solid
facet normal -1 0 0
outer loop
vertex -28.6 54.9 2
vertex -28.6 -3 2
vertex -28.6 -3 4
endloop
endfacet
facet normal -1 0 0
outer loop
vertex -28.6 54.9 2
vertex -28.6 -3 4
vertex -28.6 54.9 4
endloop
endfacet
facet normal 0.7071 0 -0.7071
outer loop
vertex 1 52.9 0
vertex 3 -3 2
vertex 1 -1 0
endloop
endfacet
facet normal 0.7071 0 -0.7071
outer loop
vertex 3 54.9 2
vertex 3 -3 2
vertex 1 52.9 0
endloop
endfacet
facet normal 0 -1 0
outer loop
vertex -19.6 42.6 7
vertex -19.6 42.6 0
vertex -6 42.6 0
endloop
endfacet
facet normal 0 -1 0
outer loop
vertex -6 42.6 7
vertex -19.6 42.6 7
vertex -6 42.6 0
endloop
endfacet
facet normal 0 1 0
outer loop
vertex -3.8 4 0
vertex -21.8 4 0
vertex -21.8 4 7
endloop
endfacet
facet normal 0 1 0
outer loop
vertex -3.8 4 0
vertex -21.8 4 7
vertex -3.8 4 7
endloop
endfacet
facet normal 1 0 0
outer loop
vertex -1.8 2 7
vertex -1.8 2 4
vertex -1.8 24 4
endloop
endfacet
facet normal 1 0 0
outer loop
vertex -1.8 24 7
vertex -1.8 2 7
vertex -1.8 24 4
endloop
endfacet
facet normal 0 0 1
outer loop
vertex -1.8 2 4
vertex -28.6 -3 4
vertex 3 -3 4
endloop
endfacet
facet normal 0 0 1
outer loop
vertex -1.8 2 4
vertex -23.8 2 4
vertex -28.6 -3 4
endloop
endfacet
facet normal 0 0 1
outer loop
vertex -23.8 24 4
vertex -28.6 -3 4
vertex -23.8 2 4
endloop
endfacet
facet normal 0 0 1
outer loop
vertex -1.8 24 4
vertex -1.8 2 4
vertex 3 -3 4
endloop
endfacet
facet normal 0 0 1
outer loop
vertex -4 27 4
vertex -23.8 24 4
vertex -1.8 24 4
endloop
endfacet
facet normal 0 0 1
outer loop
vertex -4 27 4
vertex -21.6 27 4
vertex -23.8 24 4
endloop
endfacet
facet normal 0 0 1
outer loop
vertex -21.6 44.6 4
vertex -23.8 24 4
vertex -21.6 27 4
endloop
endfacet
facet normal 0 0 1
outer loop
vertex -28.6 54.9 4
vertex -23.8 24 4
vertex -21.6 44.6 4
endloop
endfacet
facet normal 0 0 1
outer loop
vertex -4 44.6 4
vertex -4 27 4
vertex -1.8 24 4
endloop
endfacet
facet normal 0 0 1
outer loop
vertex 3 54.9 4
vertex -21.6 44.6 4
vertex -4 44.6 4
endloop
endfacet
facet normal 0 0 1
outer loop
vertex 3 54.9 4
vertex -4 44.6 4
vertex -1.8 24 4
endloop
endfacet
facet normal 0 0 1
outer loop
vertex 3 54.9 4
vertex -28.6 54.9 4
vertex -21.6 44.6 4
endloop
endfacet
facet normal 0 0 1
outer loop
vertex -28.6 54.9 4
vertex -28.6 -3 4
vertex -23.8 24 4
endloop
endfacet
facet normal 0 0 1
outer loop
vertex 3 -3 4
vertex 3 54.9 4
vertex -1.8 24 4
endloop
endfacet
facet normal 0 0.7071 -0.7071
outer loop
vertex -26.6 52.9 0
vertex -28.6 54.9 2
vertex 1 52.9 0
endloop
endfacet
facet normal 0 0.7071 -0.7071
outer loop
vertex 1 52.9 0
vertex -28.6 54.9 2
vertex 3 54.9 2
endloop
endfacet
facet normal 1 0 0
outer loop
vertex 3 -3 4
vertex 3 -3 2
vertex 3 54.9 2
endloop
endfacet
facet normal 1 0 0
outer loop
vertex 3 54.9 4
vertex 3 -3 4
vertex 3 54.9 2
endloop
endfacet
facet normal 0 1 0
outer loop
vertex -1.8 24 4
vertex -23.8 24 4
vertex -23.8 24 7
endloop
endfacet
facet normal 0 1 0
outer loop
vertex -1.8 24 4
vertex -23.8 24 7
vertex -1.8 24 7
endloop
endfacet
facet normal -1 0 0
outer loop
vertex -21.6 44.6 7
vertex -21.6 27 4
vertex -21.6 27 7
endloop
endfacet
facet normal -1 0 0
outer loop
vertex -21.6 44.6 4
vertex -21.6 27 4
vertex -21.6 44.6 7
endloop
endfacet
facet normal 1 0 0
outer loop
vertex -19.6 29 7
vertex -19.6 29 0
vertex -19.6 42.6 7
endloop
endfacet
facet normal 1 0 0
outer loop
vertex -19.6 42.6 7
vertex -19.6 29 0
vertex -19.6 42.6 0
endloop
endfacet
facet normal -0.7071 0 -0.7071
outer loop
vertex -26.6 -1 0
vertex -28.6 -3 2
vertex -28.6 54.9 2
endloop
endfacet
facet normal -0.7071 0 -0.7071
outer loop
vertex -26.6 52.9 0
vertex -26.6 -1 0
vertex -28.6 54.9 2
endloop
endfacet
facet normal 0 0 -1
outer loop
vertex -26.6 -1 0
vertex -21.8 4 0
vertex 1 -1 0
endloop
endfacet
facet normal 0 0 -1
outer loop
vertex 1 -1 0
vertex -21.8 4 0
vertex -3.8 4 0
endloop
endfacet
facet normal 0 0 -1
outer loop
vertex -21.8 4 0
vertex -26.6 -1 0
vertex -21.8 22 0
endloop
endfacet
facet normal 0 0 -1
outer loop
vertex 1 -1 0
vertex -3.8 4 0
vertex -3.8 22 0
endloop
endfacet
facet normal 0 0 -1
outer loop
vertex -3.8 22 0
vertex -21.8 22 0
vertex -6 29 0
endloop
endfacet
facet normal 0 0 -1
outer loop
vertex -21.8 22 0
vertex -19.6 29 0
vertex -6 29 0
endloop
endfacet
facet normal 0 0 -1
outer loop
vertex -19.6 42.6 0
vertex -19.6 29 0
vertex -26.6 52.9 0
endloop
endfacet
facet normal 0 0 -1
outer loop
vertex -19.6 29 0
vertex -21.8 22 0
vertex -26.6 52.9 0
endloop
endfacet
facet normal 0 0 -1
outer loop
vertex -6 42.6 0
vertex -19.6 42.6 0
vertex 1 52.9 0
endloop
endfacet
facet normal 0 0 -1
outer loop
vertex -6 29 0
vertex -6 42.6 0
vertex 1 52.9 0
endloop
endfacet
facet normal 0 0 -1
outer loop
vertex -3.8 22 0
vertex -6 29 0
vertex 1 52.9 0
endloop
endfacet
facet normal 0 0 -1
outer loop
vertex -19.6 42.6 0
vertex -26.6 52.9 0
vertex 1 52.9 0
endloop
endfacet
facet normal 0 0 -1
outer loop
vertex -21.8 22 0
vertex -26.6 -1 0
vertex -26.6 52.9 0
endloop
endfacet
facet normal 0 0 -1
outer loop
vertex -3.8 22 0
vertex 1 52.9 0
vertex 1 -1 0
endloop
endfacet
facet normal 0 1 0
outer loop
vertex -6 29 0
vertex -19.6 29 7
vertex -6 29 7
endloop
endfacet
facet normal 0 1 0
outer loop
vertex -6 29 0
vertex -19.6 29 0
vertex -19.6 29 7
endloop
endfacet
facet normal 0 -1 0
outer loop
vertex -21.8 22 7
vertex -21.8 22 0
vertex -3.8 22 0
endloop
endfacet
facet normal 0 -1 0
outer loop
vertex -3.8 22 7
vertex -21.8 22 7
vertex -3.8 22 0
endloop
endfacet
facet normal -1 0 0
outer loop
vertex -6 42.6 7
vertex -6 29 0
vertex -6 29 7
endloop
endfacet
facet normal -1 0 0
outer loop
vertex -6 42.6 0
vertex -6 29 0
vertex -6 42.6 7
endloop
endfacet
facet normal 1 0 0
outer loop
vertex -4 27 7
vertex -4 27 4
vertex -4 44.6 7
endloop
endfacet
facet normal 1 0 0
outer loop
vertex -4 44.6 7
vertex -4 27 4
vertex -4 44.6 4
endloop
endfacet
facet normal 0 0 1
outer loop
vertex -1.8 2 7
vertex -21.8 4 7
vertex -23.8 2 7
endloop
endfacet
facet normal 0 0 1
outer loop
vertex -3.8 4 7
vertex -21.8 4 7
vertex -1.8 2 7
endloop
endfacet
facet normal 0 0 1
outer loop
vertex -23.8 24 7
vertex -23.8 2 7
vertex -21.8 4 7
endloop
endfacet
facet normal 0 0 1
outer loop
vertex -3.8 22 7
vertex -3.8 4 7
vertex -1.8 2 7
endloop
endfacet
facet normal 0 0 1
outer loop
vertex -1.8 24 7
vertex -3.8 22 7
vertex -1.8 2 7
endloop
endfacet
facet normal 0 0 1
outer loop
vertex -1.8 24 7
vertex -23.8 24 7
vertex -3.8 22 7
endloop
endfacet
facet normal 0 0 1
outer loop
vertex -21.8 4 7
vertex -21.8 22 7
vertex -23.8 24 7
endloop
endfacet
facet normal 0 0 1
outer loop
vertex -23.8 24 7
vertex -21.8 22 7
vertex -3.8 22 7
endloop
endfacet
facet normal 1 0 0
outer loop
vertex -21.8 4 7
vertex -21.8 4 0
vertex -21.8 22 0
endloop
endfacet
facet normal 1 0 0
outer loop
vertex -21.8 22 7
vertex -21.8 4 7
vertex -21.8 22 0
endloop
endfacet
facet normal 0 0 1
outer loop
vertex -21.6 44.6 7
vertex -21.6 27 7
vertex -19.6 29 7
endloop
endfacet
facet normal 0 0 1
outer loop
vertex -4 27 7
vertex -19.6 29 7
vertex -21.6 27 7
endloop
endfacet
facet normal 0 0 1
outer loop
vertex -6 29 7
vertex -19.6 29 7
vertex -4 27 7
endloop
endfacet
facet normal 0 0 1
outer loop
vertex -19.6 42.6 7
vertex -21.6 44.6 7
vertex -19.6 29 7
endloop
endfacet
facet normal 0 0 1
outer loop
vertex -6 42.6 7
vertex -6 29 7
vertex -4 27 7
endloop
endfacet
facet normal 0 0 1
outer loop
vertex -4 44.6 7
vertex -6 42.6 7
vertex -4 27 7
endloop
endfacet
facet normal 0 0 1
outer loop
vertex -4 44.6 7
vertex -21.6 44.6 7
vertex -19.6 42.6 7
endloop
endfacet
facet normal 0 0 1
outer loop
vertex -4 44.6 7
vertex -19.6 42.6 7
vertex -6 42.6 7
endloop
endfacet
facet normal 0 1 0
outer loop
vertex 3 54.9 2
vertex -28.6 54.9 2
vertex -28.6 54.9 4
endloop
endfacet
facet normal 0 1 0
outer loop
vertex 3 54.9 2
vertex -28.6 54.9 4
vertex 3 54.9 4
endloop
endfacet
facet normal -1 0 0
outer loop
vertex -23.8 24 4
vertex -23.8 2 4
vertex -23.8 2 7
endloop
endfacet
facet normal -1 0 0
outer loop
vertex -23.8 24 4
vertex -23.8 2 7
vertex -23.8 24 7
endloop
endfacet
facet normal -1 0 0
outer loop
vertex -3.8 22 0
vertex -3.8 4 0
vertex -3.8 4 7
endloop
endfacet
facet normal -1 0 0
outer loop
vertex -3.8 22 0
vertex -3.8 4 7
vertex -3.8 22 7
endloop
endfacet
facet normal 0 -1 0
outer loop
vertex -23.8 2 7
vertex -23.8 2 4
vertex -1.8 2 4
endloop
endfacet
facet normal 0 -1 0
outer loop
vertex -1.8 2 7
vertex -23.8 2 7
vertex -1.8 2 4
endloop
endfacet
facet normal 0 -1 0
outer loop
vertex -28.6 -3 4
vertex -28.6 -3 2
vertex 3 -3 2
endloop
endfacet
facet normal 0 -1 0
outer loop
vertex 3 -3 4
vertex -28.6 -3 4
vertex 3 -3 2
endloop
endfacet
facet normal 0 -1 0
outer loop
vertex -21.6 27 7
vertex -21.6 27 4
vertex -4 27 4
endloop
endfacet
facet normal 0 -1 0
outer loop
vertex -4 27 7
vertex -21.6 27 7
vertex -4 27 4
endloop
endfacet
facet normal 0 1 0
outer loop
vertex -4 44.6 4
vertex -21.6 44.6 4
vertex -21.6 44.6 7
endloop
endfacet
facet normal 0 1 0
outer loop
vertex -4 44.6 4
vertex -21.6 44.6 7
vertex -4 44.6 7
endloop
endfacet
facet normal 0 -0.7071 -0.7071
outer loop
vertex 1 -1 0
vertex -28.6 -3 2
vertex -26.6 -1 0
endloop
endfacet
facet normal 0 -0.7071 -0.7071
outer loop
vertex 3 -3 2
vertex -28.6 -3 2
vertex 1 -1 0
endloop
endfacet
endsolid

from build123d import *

# Parameters (mm, degrees)
F0_W     = 31.6
F0_H     = 57.9
F0_W_2   = 25.6
F0_H_2   = 51.9
F0_W_3   = 22
F0_H_3   = 22
F0_W_4   = 17.6
F0_H_4   = 17.6
F0_W_5   = 18
F0_H_5   = 18
F0_W_6   = 13.6
F0_H_6   = 13.6
F2_DEPTH = 4
F3_START = 4
F3_DEPTH = 3
F4_SIZE  = 2


with BuildPart() as f2:
    # F0 (on Top) → F2 (new body)
    with BuildSketch(Plane.XY):
        with Locations((-12.8, 25.95)):
            Rectangle(F0_W, F0_H)
        with Locations((-12.8, 25.95)):
            Rectangle(F0_W_2, F0_H_2, mode=Mode.SUBTRACT)
        with Locations((-12.8, 25.95)):
            Rectangle(F0_W_2, F0_H_2)
        with Locations((-12.8, 13)):
            Rectangle(F0_W_3, F0_H_3, mode=Mode.SUBTRACT)
        with Locations((-12.8, 35.8)):
            Rectangle(F0_W_4, F0_H_4, mode=Mode.SUBTRACT)
        with Locations((-12.8, 13)):
            Rectangle(F0_W_3, F0_H_3)
        with Locations((-12.8, 13)):
            Rectangle(F0_W_5, F0_H_5, mode=Mode.SUBTRACT)
        with Locations((-12.8, 35.8)):
            Rectangle(F0_W_4, F0_H_4)
        with Locations((-12.8, 35.8)):
            Rectangle(F0_W_6, F0_H_6, mode=Mode.SUBTRACT)
    extrude(amount=F2_DEPTH)

    # F0 (on Top) → F3 (join)
    with BuildSketch(Plane.XY.offset(F3_START)):
        with Locations((-12.8, 35.8)):
            Rectangle(F0_W_4, F0_H_4)
        with Locations((-12.8, 35.8)):
            Rectangle(F0_W_6, F0_H_6, mode=Mode.SUBTRACT)
        with Locations((-12.8, 13)):
            Rectangle(F0_W_3, F0_H_3)
        with Locations((-12.8, 13)):
            Rectangle(F0_W_5, F0_H_5, mode=Mode.SUBTRACT)
    extrude(amount=F3_DEPTH)

    # F4
    f4_edges = [f2.edges().sort_by_distance(p)[0] for p in [
        (-28.6, 25.95, 0),
        (-12.8, -3, 0),
        (3, 25.95, 0),
        (-12.8, 54.9, 0),
    ]]
    chamfer(f4_edges, length=F4_SIZE)


solid = f2.part
